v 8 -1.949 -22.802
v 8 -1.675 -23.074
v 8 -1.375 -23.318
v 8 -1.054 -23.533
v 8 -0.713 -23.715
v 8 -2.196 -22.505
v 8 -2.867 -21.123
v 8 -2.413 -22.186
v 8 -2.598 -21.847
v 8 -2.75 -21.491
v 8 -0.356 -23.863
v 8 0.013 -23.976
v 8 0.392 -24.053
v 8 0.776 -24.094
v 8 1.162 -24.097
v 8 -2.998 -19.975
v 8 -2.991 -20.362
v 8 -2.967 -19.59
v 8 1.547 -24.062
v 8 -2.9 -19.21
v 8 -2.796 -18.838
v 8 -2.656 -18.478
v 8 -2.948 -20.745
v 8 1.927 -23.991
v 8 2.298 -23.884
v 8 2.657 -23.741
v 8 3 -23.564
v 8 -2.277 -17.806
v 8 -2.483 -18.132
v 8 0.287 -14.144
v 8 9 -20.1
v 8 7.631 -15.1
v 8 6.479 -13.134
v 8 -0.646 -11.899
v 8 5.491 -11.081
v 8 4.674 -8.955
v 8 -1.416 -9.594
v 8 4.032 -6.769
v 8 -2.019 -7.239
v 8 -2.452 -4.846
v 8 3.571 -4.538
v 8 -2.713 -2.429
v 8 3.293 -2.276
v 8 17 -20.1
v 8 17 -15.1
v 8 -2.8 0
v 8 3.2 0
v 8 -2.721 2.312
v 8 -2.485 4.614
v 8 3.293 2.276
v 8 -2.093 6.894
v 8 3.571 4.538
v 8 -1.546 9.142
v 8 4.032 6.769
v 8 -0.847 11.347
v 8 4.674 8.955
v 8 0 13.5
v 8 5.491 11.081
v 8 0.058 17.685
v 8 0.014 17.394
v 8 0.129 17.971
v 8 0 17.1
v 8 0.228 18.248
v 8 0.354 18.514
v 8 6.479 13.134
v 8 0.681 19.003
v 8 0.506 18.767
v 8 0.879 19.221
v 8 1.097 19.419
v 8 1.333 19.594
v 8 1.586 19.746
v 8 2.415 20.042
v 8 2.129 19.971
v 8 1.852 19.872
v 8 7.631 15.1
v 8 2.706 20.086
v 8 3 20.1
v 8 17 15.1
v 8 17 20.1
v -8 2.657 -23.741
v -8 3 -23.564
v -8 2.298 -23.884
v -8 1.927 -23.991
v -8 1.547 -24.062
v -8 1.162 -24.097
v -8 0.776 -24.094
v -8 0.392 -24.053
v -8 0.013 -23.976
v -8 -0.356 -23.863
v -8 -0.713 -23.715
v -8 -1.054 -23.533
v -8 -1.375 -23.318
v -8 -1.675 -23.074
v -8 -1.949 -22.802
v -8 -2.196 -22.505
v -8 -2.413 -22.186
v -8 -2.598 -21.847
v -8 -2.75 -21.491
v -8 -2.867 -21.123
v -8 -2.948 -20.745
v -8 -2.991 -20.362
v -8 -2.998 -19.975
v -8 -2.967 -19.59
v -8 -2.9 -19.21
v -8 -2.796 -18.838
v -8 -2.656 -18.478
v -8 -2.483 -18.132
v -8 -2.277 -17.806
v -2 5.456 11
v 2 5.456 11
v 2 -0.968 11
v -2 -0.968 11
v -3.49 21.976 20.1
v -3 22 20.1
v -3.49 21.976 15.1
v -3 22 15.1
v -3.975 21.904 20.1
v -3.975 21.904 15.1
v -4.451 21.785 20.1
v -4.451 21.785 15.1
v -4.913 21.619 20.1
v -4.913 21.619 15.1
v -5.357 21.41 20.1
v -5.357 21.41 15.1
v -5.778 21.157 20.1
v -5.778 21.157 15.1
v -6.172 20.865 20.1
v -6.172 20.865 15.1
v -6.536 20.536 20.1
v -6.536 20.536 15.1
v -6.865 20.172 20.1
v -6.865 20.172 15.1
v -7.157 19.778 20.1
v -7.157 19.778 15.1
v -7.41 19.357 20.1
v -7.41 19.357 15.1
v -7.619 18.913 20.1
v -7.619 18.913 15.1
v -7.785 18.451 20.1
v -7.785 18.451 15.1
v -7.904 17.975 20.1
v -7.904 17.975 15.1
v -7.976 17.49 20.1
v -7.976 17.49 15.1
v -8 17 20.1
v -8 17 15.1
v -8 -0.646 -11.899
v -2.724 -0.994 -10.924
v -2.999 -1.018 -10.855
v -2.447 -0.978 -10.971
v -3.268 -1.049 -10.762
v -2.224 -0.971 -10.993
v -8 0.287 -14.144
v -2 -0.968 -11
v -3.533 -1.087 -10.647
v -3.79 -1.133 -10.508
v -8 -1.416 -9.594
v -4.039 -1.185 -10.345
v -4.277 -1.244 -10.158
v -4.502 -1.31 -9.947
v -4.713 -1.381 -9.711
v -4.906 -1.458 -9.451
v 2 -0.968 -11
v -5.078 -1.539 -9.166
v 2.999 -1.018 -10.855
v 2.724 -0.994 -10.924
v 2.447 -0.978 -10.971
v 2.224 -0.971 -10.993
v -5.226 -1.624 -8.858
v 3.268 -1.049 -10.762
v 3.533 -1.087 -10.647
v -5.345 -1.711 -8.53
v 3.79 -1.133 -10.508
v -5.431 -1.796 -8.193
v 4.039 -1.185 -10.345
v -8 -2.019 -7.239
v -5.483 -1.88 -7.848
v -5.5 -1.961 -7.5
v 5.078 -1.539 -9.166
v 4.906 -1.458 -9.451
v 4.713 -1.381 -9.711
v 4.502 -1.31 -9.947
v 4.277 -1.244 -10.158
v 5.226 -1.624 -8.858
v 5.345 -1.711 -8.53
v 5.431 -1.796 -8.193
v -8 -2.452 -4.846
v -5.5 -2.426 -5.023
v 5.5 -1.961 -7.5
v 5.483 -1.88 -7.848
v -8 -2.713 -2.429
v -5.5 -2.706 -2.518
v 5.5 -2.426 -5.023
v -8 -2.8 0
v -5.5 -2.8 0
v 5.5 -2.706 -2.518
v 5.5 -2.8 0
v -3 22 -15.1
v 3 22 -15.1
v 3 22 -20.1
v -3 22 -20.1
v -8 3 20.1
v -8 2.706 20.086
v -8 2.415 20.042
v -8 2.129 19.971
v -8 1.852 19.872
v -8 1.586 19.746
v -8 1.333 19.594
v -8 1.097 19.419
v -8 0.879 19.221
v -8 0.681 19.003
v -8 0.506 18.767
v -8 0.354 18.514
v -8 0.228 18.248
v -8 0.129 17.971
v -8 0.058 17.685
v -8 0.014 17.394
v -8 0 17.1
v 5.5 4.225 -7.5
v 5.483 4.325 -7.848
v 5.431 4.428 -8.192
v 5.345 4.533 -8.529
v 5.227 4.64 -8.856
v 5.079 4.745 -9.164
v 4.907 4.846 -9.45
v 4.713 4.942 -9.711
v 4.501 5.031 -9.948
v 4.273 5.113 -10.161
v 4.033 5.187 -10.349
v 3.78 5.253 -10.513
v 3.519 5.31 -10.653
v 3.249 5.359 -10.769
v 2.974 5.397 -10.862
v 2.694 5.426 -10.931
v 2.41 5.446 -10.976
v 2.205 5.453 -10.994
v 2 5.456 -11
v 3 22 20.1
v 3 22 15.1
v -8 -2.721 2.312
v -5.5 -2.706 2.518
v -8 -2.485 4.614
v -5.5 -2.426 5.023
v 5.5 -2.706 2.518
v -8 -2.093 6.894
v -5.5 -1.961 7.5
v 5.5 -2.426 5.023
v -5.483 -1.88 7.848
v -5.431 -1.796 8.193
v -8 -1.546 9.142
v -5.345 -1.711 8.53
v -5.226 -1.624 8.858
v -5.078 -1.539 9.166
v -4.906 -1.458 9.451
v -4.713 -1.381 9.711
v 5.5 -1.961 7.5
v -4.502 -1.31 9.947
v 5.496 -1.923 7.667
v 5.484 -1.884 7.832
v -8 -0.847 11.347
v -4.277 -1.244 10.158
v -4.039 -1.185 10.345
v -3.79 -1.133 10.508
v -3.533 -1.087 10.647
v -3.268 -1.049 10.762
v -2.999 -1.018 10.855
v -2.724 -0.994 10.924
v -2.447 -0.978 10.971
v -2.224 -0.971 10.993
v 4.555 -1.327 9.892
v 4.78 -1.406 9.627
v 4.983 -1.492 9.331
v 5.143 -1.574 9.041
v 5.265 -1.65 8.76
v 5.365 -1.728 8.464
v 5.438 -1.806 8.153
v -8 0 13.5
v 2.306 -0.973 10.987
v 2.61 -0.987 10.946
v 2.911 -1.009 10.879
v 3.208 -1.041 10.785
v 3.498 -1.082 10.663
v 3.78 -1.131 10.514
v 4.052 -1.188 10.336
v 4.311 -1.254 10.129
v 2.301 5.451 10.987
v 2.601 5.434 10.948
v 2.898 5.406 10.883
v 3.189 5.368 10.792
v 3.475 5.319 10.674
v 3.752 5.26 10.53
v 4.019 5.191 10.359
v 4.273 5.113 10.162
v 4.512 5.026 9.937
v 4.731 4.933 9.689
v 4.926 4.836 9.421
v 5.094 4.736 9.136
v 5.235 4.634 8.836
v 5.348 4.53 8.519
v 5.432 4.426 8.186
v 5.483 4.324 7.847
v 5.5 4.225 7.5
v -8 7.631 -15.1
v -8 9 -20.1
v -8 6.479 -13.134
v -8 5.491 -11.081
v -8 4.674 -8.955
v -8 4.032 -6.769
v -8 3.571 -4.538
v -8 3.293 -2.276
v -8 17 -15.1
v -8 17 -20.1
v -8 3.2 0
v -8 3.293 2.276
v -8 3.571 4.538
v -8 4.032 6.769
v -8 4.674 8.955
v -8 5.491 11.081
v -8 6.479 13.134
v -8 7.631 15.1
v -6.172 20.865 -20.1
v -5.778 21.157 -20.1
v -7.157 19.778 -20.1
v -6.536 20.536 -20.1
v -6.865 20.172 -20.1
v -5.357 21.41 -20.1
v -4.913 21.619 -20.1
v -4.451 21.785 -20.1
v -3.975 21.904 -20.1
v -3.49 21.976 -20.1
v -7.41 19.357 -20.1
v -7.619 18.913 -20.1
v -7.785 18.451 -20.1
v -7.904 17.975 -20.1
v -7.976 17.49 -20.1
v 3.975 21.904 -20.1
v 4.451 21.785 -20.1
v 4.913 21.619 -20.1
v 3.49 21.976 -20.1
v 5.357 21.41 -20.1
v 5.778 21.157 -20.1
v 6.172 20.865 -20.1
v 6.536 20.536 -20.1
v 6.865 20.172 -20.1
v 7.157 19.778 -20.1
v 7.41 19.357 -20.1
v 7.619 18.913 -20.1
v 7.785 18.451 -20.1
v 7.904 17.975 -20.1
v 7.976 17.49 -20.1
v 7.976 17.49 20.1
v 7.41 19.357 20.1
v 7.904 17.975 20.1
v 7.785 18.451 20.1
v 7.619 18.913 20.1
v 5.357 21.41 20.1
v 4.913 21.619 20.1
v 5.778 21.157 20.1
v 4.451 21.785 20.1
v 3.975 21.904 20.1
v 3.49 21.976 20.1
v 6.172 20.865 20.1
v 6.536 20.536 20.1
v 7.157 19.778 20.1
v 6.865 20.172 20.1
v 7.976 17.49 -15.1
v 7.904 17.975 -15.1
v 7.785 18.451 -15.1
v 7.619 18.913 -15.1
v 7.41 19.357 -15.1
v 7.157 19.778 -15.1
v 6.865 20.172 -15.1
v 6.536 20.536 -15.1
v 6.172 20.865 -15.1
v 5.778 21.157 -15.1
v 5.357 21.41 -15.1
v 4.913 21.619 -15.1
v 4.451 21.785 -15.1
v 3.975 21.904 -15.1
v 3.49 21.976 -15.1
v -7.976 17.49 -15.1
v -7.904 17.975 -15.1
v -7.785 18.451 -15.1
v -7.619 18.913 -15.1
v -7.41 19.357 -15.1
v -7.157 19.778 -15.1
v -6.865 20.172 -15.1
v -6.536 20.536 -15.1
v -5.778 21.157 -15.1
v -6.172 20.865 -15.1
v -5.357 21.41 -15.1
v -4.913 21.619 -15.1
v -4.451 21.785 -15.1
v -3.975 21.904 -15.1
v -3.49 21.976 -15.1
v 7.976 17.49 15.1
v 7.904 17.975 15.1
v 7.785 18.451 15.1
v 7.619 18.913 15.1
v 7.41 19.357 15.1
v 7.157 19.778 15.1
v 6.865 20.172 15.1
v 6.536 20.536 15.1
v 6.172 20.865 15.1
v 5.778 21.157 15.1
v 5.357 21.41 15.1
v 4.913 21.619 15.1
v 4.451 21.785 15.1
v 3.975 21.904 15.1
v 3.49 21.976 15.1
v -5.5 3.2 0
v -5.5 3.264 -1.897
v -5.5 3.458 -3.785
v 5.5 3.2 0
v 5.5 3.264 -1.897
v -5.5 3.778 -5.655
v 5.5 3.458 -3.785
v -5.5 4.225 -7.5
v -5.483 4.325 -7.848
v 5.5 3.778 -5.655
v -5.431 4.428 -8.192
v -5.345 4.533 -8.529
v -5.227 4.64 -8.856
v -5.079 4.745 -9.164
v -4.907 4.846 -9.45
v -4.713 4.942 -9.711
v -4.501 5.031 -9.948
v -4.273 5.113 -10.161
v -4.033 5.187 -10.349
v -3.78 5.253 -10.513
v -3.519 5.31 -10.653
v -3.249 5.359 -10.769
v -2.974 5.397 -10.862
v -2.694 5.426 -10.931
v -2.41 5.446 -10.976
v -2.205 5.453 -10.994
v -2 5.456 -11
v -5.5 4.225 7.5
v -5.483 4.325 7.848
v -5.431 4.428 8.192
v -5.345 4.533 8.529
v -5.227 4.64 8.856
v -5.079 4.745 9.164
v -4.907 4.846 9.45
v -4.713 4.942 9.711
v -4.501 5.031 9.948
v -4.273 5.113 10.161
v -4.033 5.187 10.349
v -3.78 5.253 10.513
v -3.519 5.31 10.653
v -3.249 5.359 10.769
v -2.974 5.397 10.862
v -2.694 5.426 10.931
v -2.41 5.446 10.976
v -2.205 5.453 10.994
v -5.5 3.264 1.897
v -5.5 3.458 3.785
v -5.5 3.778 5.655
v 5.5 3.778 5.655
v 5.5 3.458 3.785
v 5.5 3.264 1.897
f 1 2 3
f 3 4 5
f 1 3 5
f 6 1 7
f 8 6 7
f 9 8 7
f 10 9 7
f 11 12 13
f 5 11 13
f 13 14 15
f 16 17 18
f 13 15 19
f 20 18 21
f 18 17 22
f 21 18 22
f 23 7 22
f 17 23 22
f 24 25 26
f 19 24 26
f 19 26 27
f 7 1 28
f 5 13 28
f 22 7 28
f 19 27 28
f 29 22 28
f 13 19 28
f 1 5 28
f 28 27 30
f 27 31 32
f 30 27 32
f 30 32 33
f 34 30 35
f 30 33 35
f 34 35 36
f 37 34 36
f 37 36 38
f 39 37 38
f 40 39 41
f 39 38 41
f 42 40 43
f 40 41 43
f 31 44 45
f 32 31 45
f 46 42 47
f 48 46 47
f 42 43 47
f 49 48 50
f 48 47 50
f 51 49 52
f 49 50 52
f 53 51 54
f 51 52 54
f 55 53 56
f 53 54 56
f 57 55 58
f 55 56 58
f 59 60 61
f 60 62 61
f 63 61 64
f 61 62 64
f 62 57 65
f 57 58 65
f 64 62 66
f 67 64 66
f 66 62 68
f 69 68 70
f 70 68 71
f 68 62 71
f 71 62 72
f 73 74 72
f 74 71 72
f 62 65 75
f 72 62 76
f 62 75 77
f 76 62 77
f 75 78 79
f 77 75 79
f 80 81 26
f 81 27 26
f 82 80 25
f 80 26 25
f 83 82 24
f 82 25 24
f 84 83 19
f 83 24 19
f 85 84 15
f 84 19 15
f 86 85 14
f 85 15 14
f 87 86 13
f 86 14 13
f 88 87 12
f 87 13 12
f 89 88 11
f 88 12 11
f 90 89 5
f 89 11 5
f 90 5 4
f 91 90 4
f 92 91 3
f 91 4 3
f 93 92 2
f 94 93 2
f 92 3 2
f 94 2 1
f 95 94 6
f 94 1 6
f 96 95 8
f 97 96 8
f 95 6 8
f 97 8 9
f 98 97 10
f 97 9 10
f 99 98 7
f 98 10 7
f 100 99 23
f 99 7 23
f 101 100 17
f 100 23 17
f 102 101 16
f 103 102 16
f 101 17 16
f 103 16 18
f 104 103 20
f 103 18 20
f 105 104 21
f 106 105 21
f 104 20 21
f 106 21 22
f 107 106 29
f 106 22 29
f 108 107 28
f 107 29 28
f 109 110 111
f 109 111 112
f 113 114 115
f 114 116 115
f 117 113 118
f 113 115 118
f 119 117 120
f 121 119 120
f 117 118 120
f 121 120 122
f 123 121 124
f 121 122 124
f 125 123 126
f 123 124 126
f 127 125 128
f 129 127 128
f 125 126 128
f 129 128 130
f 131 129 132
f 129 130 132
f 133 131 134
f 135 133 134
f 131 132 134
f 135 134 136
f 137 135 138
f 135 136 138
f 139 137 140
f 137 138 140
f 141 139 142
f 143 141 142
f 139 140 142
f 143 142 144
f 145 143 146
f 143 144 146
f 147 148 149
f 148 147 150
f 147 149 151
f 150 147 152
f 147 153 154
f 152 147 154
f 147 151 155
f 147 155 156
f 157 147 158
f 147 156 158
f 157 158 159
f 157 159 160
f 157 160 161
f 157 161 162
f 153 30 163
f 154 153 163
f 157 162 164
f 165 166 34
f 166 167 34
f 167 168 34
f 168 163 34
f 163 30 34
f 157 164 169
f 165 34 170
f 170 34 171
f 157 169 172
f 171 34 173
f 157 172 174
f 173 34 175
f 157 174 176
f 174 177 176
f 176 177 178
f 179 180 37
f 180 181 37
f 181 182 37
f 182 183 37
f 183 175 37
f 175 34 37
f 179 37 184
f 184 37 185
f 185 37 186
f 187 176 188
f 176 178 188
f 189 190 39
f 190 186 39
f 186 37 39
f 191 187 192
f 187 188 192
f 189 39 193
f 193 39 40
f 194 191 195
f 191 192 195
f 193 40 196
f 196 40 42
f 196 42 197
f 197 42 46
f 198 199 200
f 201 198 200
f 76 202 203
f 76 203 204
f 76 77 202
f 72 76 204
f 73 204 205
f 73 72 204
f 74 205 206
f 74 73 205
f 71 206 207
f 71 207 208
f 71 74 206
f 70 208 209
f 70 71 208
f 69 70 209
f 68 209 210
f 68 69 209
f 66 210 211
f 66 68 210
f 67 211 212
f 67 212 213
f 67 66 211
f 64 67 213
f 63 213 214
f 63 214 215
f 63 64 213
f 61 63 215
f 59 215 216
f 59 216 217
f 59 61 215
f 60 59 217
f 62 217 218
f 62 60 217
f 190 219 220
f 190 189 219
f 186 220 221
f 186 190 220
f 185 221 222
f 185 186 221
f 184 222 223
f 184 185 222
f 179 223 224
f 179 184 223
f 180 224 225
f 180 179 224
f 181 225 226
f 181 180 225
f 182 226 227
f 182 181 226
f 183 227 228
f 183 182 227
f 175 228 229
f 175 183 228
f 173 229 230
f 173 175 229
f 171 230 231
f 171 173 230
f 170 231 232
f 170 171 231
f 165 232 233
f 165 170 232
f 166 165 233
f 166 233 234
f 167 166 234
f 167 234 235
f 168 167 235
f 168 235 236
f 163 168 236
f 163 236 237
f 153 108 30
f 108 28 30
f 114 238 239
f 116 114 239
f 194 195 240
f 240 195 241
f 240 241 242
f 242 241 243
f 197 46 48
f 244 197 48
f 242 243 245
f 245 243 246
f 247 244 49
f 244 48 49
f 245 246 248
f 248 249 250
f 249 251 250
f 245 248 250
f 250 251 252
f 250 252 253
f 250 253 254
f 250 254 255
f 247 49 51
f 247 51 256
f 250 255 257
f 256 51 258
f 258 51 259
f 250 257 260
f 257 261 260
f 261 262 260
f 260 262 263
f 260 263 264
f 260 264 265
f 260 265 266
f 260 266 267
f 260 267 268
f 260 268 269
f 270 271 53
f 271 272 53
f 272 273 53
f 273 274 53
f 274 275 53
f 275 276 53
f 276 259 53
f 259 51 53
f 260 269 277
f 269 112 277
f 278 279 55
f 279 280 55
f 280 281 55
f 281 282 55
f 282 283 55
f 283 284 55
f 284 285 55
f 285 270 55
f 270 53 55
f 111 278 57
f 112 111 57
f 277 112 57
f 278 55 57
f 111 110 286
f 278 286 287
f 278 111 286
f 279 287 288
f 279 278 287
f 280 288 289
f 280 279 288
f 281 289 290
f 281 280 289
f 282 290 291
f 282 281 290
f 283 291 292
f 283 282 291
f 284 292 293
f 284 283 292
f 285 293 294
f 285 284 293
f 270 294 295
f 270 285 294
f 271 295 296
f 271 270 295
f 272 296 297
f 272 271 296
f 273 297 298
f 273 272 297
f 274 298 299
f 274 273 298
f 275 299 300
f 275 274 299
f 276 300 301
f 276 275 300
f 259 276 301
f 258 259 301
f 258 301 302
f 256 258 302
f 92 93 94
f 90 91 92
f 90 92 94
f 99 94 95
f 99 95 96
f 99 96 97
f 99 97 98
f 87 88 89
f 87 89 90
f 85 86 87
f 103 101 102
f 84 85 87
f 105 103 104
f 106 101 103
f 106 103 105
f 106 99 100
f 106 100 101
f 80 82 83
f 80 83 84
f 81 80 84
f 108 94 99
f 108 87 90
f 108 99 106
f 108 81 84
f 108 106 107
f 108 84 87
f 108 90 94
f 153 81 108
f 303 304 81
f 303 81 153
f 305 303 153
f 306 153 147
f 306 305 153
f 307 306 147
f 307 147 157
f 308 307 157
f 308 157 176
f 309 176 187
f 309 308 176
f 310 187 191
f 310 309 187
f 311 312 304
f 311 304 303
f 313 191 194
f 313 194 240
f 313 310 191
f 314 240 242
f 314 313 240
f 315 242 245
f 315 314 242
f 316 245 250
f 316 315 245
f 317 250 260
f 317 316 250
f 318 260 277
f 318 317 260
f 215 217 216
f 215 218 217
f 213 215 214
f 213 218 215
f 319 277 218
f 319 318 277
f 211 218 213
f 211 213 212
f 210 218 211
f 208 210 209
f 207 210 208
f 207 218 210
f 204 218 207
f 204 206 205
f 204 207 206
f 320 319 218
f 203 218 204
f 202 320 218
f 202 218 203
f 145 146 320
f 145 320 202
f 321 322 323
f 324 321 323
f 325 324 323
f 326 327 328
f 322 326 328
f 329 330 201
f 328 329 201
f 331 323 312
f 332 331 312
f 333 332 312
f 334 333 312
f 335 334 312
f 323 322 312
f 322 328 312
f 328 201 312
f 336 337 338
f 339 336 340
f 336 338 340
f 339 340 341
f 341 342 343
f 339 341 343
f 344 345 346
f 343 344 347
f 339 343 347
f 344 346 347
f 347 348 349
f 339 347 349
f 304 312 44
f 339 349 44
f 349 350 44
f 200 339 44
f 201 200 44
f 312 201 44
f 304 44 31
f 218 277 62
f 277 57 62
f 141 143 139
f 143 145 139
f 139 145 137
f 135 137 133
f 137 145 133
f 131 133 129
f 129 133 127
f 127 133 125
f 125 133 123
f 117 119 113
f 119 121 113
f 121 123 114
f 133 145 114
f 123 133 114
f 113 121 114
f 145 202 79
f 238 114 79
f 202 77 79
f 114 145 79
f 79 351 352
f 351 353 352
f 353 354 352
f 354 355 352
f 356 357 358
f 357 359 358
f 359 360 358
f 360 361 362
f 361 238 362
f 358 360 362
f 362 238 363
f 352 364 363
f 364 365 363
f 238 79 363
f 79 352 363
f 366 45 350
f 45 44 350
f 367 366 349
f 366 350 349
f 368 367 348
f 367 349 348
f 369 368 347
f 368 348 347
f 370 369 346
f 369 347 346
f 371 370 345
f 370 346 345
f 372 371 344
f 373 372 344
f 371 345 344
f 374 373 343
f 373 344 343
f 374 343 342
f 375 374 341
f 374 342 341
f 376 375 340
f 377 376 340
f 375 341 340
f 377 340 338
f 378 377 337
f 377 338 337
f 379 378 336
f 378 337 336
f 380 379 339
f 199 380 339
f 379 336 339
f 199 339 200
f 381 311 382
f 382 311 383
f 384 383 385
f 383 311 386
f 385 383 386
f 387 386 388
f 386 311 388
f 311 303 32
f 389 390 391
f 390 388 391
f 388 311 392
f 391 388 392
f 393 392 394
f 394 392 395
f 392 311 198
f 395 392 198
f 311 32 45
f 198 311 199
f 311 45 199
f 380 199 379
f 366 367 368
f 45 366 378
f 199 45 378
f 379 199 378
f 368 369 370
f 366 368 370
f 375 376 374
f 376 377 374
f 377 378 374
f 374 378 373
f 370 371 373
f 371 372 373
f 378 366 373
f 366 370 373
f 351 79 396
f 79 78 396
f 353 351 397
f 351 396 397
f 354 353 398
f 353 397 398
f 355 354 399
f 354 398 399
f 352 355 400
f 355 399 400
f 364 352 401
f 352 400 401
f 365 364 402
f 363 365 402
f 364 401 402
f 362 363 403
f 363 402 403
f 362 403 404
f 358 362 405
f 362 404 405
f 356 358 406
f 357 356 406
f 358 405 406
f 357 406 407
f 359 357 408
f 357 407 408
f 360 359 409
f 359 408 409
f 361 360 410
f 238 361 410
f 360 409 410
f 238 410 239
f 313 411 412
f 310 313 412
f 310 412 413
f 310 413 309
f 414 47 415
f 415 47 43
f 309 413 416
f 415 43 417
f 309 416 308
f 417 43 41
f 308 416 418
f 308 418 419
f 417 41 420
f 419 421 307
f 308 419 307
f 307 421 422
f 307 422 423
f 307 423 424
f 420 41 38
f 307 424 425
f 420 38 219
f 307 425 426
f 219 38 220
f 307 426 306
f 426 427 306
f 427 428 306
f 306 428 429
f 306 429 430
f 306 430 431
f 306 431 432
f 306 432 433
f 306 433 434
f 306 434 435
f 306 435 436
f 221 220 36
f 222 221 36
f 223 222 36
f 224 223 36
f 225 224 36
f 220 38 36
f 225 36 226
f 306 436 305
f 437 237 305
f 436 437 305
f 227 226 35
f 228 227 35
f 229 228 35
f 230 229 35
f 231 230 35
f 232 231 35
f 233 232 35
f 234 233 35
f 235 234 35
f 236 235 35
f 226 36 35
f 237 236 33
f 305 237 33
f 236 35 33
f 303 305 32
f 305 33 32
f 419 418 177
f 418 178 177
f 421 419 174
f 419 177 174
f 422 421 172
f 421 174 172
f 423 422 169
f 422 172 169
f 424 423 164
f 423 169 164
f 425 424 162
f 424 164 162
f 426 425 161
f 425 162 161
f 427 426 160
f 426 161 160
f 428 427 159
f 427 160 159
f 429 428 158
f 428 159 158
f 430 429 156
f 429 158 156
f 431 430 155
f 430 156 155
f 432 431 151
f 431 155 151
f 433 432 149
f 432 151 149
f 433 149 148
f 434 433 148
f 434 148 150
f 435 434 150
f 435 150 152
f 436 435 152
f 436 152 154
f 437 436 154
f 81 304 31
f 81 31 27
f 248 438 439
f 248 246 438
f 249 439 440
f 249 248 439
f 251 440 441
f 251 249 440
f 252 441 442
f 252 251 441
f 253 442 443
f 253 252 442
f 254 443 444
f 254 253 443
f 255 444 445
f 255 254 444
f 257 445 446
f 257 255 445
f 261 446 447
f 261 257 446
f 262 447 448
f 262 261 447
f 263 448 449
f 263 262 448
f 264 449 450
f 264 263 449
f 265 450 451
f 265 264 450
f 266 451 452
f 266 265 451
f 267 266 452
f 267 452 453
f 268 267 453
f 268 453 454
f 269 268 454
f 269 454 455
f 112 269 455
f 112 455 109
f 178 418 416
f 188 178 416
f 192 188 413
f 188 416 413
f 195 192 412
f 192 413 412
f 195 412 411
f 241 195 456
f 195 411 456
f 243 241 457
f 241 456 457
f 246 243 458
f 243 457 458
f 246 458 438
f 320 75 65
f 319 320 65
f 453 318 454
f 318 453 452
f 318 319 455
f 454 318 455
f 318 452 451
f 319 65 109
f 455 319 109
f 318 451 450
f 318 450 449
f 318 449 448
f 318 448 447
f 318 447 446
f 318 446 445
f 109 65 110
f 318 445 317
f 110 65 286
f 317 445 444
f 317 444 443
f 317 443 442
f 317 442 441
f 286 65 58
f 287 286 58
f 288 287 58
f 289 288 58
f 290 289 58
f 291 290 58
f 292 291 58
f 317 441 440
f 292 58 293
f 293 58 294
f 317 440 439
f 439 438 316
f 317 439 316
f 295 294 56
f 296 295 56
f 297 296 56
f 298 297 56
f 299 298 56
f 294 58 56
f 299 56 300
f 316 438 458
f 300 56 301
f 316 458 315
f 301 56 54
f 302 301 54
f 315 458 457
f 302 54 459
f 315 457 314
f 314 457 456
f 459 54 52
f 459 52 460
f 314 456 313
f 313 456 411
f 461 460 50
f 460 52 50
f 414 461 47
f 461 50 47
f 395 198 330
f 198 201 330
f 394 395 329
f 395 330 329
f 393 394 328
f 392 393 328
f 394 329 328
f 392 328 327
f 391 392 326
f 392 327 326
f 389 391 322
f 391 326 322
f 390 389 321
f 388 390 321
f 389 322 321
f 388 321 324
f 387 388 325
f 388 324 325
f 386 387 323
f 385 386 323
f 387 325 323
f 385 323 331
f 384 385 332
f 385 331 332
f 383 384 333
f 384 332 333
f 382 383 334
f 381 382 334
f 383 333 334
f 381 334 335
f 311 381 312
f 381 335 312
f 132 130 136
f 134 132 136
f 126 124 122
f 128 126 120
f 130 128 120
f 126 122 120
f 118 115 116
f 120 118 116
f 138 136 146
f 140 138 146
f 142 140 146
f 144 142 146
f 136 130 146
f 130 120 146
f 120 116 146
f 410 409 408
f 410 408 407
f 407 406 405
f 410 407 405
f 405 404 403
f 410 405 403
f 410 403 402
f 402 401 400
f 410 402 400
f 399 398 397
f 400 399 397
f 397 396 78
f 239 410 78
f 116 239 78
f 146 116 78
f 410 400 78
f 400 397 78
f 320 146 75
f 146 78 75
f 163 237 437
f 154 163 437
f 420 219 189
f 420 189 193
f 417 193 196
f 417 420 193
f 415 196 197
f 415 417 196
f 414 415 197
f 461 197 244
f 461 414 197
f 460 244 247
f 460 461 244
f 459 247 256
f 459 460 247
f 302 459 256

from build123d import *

# Parameters (mm, degrees)
VYSUNOUT1_DEPTH          = 8
ZAOBLIT1_R               = 5
ZAOBLIT2_R               = 3
SKICA2_W                 = 11
SKICA2_H                 = 22
ODEBRAT_VYSUNUT_M1_DEPTH = 12
ZAOBLIT3_R               = 3.5


with BuildPart() as part:
    # Skica1 → Vysunout1 (new body, symmetric)
    with BuildSketch(Plane(origin=(0, 0, 0), x_dir=(0, 0, -1), z_dir=(1, 0, 0))):
        with BuildLine():
            Line((-20.1, 0), (-20.1, 22))
            Line((-20.1, 22), (-15.1, 22))
            Line((-15.1, 22), (-15.1, 7.630965))
            ThreePointArc((-15.1, 7.630965), (-7.868346, 4.330613), (0, 3.2))
            ThreePointArc((0, 3.2), (7.868346, 4.330613), (15.1, 7.630965))
            Line((15.1, 7.630965), (15.1, 22))
            Line((15.1, 22), (20.1, 22))
            Line((20.1, 22), (20.1, 9))
            Line((20.1, 9), (23.564102, 3))
            ThreePointArc((23.564102, 3), (22.802361, -1.949109), (17.805694, -2.276608))
            Line((17.805694, -2.276608), (14.144179, 0.287213))
            ThreePointArc((14.144179, 0.287213), (7.238589, -2.019217), (0, -2.8))
            ThreePointArc((0, -2.8), (-6.893657, -2.09263), (-13.5, 0))
            Line((-13.5, 0), (-20.1, 0))
        make_face()
    extrude(amount=VYSUNOUT1_DEPTH, both=True)

    # Zaoblit1
    zaoblit1_edges = [part.edges().sort_by_distance(p)[0] for p in [
        (-8, 22, 17.6),
        (-8, 22, -17.6),
        (8, 22, -17.6),
        (8, 22, 17.6),
    ]]
    fillet(zaoblit1_edges, radius=ZAOBLIT1_R)

    # Zaoblit2
    zaoblit2_edges = [part.edges().sort_by_distance(p)[0] for p in [
        (-4, 0, 20.1),
    ]]
    fillet(zaoblit2_edges, radius=ZAOBLIT2_R)

    # Skica2 → Odebrat vysunutím1 (cut, through all)
    with BuildSketch(Plane(origin=(0, 8, 0), x_dir=(-1, 0, 0), z_dir=(0, 1, 0))):
        Rectangle(SKICA2_W, SKICA2_H)
    extrude(amount=-ODEBRAT_VYSUNUT_M1_DEPTH, mode=Mode.SUBTRACT)

    # Zaoblit3
    zaoblit3_edges = [part.edges().sort_by_distance(p)[0] for p in [
        (-5.5, 2.2439, -11),
        (5.5, 2.2439, -11),
        (5.5, 2.2439, 11),
        (-5.5, 2.2439, 11),
    ]]
    fillet(zaoblit3_edges, radius=ZAOBLIT3_R)


solid = part.part
